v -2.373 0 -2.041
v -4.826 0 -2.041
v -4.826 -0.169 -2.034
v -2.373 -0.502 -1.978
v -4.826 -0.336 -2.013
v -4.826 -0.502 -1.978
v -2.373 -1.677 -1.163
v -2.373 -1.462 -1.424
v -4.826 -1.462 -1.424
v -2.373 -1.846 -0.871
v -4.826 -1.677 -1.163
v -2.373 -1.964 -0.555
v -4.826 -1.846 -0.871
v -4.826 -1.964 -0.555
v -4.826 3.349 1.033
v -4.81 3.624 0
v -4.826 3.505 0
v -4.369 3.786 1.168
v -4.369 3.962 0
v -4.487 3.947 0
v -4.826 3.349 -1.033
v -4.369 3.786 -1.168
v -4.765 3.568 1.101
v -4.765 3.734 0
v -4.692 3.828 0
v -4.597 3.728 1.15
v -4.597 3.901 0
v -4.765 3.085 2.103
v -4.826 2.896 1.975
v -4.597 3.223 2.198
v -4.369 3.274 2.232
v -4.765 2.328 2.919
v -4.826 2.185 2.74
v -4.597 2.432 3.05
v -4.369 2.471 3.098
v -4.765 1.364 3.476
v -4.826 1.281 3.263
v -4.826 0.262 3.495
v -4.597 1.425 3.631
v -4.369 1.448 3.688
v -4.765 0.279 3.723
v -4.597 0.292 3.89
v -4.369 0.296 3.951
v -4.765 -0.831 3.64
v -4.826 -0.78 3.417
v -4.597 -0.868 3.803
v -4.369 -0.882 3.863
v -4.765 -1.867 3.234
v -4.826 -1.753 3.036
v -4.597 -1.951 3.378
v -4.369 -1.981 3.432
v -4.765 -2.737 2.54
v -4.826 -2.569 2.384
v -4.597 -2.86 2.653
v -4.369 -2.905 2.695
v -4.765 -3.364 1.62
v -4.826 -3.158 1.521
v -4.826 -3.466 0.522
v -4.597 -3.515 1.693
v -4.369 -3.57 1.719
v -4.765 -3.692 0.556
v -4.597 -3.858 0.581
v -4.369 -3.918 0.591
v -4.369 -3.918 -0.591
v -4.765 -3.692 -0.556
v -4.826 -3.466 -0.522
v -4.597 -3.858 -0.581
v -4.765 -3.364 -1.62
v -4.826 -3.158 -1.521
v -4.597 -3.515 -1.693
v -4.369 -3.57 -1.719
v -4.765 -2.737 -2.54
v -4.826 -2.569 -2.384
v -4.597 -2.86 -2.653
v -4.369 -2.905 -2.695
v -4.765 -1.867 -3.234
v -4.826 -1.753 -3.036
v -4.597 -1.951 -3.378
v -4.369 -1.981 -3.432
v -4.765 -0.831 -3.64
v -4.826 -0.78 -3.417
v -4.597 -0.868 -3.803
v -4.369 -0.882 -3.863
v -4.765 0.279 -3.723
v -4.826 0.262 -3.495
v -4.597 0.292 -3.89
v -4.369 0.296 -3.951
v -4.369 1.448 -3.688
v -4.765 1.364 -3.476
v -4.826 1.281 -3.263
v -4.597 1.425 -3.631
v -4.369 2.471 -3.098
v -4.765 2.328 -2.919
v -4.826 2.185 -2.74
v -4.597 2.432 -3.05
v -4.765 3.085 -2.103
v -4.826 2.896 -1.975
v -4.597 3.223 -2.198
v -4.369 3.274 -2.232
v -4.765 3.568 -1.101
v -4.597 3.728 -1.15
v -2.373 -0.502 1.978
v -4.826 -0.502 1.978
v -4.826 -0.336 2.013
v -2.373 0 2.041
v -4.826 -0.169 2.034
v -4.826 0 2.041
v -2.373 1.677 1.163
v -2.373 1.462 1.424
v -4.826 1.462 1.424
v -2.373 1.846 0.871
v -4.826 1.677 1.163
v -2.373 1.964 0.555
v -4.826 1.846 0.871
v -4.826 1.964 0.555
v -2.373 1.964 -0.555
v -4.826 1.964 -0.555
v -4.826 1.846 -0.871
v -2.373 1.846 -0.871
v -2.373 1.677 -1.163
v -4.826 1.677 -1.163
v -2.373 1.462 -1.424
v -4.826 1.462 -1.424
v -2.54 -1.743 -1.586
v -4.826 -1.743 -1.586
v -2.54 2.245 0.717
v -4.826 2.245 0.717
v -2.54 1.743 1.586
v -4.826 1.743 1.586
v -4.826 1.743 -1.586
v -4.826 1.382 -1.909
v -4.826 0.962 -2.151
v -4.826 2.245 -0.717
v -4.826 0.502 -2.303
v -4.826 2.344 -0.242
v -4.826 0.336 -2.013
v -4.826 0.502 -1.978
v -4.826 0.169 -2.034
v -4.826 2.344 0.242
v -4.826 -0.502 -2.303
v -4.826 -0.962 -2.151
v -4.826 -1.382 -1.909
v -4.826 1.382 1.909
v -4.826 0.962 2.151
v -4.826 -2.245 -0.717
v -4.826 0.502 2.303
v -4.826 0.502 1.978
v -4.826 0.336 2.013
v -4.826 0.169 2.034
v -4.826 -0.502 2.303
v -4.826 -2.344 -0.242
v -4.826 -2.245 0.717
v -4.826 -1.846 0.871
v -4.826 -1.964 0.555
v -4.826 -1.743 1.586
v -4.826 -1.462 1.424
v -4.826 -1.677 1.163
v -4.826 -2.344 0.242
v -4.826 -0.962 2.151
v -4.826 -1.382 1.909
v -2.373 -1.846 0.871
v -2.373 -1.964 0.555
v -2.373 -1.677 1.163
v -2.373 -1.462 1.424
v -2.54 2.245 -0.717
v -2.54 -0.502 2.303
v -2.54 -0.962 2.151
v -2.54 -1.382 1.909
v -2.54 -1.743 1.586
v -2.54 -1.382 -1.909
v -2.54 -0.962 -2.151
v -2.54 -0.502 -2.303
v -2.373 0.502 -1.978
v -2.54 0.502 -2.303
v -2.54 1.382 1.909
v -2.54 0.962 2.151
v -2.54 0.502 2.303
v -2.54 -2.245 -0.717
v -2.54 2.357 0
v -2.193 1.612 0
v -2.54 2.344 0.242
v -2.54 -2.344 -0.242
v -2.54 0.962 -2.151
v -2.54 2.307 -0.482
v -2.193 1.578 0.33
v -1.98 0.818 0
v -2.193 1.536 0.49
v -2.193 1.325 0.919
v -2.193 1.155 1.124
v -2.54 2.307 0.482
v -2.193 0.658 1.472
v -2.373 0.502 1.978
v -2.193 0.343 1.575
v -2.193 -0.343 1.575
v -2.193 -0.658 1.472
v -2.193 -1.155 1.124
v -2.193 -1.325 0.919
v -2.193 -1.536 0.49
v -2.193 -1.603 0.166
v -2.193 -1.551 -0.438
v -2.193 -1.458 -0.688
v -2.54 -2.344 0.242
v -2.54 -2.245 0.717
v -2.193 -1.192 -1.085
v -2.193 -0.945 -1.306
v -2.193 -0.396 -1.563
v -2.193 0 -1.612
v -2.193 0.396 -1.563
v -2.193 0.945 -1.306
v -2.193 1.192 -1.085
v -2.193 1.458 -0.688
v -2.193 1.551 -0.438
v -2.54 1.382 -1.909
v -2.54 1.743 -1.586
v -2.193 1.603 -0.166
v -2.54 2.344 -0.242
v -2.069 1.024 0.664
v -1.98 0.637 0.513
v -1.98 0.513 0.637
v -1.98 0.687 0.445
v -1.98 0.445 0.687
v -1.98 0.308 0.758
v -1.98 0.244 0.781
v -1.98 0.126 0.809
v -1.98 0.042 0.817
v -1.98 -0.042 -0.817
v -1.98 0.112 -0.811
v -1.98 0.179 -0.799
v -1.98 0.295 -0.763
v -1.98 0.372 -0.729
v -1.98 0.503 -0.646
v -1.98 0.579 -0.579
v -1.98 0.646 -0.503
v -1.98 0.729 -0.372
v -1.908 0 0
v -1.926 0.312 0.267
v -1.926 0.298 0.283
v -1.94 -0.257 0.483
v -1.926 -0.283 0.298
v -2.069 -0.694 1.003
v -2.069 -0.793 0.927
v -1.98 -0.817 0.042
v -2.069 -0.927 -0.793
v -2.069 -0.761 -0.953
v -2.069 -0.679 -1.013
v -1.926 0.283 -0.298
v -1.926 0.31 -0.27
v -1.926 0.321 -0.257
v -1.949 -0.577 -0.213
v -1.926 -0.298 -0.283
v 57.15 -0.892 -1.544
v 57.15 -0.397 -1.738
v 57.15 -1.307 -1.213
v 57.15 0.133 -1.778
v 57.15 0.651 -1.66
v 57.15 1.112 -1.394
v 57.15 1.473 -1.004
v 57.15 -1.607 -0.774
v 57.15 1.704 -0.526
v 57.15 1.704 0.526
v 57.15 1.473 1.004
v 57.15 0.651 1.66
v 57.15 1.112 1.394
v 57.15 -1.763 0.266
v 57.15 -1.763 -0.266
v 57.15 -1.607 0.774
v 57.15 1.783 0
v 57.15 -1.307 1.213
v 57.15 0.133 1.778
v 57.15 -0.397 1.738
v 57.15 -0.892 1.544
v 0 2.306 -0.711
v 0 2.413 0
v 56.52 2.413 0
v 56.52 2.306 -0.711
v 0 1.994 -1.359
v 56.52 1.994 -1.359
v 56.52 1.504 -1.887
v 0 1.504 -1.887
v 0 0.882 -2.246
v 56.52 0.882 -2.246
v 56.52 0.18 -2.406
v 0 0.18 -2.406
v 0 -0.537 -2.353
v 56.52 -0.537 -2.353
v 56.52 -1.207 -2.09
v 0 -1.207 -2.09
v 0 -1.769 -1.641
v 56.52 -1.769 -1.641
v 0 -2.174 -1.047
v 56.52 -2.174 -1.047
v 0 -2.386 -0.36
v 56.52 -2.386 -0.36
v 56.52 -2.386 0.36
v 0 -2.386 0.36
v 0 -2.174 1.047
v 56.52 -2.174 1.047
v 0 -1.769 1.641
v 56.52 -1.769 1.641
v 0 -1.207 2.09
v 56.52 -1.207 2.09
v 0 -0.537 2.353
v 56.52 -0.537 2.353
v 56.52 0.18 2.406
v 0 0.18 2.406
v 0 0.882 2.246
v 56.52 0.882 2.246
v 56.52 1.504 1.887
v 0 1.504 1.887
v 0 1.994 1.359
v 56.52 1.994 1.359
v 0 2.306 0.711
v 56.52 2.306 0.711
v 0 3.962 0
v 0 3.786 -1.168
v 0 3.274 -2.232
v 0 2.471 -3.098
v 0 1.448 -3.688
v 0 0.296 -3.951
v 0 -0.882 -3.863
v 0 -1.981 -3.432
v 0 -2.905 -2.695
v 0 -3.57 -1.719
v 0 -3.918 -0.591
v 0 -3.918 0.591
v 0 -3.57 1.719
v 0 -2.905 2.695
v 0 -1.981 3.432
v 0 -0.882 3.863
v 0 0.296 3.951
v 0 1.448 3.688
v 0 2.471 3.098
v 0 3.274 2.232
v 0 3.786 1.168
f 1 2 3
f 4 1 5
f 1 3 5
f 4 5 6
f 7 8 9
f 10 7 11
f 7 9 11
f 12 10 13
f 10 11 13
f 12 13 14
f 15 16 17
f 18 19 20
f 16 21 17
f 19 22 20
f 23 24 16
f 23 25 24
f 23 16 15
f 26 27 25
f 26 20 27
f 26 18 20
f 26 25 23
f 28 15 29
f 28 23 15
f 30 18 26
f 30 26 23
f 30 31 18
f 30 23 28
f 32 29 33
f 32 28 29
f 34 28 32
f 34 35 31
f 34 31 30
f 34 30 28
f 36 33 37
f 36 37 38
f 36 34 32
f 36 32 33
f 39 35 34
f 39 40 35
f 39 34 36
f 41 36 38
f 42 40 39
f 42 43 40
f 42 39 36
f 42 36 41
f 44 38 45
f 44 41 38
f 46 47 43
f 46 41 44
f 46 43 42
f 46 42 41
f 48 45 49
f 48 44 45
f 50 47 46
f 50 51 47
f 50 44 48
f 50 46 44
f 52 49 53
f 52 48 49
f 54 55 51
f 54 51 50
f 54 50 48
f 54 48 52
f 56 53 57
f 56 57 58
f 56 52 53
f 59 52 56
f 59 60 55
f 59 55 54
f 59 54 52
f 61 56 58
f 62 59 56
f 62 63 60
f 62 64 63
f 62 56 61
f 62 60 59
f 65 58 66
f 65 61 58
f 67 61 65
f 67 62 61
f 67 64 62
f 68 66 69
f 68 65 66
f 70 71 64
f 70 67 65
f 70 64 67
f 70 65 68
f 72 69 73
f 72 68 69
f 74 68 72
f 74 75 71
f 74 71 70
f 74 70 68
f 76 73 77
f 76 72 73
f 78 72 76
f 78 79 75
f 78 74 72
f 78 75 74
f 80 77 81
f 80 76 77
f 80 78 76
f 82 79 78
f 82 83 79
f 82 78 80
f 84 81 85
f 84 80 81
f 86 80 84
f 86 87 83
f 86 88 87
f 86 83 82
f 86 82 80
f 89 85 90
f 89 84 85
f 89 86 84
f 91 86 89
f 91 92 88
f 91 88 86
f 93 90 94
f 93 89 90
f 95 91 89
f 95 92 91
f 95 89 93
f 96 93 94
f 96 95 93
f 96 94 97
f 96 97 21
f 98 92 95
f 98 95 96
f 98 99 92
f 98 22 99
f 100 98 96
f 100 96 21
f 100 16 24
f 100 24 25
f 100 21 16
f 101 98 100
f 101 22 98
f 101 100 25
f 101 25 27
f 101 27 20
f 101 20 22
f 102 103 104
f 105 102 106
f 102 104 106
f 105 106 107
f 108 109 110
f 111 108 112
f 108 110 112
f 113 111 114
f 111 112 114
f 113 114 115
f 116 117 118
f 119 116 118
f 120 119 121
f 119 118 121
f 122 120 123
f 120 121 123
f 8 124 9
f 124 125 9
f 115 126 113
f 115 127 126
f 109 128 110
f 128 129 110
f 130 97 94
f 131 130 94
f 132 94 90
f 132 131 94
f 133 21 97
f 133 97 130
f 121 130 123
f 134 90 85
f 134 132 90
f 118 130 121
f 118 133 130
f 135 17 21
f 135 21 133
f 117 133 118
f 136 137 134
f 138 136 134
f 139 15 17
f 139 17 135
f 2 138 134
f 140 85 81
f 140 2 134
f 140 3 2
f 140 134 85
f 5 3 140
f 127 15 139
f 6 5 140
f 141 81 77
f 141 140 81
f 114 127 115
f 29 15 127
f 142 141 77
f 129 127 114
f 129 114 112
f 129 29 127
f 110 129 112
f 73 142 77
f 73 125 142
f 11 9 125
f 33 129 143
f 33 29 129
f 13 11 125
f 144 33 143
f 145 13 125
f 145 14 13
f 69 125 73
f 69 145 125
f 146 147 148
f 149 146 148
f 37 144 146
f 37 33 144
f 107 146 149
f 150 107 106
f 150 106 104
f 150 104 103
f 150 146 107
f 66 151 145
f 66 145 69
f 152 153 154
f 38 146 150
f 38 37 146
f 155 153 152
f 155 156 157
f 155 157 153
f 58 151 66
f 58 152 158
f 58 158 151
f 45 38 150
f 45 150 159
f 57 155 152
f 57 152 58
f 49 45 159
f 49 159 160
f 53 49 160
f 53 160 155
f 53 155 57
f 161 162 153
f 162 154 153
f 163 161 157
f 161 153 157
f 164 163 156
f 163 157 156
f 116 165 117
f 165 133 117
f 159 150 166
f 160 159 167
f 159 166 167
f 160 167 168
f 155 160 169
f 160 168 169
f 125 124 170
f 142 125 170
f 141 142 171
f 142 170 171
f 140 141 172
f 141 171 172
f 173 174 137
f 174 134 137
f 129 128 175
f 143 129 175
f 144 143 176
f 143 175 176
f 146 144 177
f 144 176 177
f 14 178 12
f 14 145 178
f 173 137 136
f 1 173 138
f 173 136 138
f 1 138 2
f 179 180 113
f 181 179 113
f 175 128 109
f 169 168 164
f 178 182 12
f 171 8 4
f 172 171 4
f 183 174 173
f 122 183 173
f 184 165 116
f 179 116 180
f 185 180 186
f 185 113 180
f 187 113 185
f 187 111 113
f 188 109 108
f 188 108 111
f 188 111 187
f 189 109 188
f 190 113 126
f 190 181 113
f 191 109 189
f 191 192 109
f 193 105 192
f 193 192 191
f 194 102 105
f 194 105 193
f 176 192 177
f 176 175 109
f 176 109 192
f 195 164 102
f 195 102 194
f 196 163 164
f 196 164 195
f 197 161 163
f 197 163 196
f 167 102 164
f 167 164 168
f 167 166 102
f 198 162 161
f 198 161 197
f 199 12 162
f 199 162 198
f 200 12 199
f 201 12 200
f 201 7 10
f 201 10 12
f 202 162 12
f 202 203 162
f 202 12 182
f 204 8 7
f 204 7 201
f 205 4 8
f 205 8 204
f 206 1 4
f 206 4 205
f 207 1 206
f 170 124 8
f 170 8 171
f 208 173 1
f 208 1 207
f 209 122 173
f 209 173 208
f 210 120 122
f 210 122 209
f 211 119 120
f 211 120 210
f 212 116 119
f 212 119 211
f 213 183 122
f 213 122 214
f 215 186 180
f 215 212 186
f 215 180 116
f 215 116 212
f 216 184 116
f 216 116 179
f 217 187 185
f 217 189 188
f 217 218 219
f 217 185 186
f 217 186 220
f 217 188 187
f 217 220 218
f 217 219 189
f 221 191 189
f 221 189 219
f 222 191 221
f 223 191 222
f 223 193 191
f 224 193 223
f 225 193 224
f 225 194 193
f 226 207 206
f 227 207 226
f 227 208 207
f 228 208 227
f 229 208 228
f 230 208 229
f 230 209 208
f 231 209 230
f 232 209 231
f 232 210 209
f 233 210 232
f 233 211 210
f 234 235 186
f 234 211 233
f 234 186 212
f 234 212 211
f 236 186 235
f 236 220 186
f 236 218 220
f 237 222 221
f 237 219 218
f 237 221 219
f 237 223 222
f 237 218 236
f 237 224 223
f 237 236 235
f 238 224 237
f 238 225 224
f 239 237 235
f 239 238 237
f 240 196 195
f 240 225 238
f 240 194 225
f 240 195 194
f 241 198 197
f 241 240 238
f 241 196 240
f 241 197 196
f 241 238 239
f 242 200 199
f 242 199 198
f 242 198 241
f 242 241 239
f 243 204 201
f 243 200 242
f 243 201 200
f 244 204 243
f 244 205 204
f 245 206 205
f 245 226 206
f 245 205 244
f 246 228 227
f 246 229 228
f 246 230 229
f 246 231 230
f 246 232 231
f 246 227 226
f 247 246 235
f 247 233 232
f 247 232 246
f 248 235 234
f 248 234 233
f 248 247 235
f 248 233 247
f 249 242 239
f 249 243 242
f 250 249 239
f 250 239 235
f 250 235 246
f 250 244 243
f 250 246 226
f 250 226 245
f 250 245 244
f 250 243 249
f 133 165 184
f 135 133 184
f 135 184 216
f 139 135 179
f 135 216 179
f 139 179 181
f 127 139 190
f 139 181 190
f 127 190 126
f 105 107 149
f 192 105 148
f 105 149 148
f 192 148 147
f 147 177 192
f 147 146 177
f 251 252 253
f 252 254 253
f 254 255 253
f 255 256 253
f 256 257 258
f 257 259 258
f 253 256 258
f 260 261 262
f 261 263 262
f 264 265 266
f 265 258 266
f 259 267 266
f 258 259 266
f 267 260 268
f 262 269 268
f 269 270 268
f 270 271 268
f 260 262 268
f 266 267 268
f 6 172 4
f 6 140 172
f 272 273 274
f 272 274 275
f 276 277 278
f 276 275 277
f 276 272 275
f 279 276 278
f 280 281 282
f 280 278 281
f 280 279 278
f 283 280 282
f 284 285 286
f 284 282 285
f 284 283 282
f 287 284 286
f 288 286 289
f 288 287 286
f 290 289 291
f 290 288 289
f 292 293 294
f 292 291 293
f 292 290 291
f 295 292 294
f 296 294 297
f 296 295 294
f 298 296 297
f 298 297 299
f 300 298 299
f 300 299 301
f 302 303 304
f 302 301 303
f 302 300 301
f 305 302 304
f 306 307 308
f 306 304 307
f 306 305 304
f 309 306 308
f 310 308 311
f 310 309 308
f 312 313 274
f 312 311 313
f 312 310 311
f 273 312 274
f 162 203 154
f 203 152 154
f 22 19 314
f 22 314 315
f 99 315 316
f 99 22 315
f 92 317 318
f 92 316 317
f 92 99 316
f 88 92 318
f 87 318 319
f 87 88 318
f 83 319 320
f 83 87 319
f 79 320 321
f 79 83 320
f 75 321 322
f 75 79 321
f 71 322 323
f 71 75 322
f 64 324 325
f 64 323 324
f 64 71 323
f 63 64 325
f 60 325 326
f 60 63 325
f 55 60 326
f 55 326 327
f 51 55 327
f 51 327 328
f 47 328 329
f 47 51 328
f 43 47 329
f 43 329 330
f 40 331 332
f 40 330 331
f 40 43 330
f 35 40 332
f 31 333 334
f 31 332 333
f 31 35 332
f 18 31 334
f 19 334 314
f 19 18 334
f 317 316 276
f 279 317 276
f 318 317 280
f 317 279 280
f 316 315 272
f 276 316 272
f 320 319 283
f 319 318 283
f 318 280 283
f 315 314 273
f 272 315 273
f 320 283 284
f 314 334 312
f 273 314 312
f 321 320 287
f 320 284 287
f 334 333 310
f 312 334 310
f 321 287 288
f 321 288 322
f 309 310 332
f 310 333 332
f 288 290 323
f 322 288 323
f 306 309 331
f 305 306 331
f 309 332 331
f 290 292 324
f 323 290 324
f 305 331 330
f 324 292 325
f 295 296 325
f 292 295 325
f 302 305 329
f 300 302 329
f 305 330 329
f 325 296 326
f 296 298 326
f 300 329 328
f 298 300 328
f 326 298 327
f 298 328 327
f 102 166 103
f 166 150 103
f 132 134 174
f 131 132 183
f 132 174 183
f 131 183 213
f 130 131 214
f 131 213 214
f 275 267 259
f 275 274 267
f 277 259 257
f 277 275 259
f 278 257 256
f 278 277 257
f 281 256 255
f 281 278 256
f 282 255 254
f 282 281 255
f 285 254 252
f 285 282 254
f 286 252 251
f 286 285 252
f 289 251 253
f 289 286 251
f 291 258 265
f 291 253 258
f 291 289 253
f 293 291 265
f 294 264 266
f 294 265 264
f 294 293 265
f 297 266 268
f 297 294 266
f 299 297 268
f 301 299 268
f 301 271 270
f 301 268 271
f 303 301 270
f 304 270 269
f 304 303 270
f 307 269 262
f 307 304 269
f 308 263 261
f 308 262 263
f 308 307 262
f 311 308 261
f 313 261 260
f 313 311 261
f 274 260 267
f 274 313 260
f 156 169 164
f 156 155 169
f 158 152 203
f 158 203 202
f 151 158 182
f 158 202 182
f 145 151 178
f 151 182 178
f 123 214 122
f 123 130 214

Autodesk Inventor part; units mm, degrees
ref_plane "YZ Plane" through (0, 0, 0) normal (1, 0, 0) x (0, 1, 0)
sketch "Sketch1" plane through (0, 0, 0) normal (0, 0, 1) x (1, 0, 0)
  line L0 (-4.826, 0) -> (57.15, 0)
  line L1 (57.15, 0) -> (57.15, 2.413)
  line L2 (57.15, 2.413) -> (0, 2.413)
  line L3 (0, 2.413) -> (0, 3.9624)
  line L4 (-19.3761, 0) -> (69.9044, 0) projected
  line L5 (0, -0.7925) -> (0, 4.7549) projected
  line L6 (0, 3.9624) -> (-4.826, 3.9624)
  line L7 (-4.826, 0) -> (-4.826, 3.9624)
  arc A0 (-1.9085, 0) -> (-2.54, 2.3566) centre (-6.6218, 0) ccw
  line L8 (-4.826, 2.3566) -> (-2.54, 2.3566)
  line L9 (12.7, 2.413) -> (0, 2.413) construction
  dimension "d0" = 57.15
  dimension "d1" = 4.826
  dimension "d2" = 4.826
  dimension "d5" = 7.9248
  dimension "d13" = 4.7132
  dimension "d14" = 4.7132
  dimension "d15" = 2.286
revolve "Body" add sketch "Sketch1" angle 360 about axis through (-4.826, 0, 0) along (1, 0, 0) contours A0 L8 L7 L6 L3 L5 L0 | L5 L2 L1 L0
ref_plane "IDS_WORKPLANE{1}" through (-4.826, 0, 0) normal (1, 0, 0) x (0, 0, -1)
sketch "Sketch2" plane through (-4.826, 0, 0) normal (1, 0, 0) x (0, 0, -1)
  line L0 (0, -5.5474) -> (0, 5.5474) projected
  line L1 (5.7744, 0) -> (-5.5852, 0) projected
  circle A0 centre (0, 0) radius 3.9624 projected
  line L2 (2.3026, 0.5017) -> (1.9783, 0.5016)
  line L3 (0, 0) -> (2.3026, 0.5017) construction
  line L4 (0, 0) -> (4.1516, 3.7764) construction
  line L5 (0, 0) -> (0.7169, 2.2449) construction
  line L6 (0, 0) -> (1.1783, 2.0409) construction
  line L7 (0.7169, 2.2449) -> (0.5547, 1.9641)
  line L8 (1.5857, 1.7433) -> (1.4236, 1.4624)
  line L9 (0, 0) -> (1.5857, 1.7433) construction
  arc A1 (2.0409, 0) -> (1.9783, 0.5016) centre (0, 0) ccw
  arc A2 (1.4236, 1.4624) -> (0.5547, 1.9641) centre (0, 0) ccw
  arc A3 (2.3566, 0) -> (2.3026, 0.5017) centre (0, 0) ccw
  arc A4 (1.5857, 1.7433) -> (0.7169, 2.2449) centre (0, 0) ccw
  arc A5 (2.3026, 0.5017) -> (1.3897, 1.9032) centre (0, 0) ccw construction
  arc A6 (1.9783, 0.5016) -> (1.4236, 1.4624) centre (0, 0) ccw construction
  line L10 (2.3026, -0.5017) -> (1.9783, -0.5016)
  line L11 (0.7169, -2.2449) -> (0.5547, -1.9641)
  line L12 (1.5857, -1.7433) -> (1.4236, -1.4624)
  arc A7 (1.9783, -0.5016) -> (2.0409, 0) centre (0, 0) ccw
  arc A8 (0.5547, -1.9641) -> (1.4236, -1.4624) centre (0, 0) ccw
  arc A9 (2.3026, -0.5017) -> (2.3566, 0) centre (0, 0) ccw
  arc A10 (0.7169, -2.2449) -> (1.5857, -1.7433) centre (0, 0) ccw
  line L13 (-2.3026, 0.5017) -> (-1.9783, 0.5016)
  line L14 (-0.7169, 2.2449) -> (-0.5547, 1.9641)
  line L15 (-1.5857, 1.7433) -> (-1.4236, 1.4624)
  arc A11 (-1.9783, 0.5016) -> (-2.0409, 0) centre (0, 0) ccw
  arc A12 (-0.5547, 1.9641) -> (-1.4236, 1.4624) centre (0, 0) ccw
  arc A13 (-2.3026, 0.5017) -> (-2.3566, 0) centre (0, 0) ccw
  arc A14 (-0.7169, 2.2449) -> (-1.5857, 1.7433) centre (0, 0) ccw
  line L16 (-0.7169, -2.2449) -> (-0.5547, -1.9641)
  arc A15 (-1.4236, -1.4624) -> (-0.5547, -1.9641) centre (0, 0) ccw
  line L17 (-1.5857, -1.7433) -> (-1.4236, -1.4624)
  arc A16 (-1.5857, -1.7433) -> (-0.7169, -2.2449) centre (0, 0) ccw
  arc A17 (-2.0409, 0) -> (-1.9783, -0.5016) centre (0, 0) ccw
  line L18 (-2.3026, -0.5017) -> (-1.9783, -0.5016)
  arc A18 (-2.3566, 0) -> (-2.3026, -0.5017) centre (0, 0) ccw
  point P0 (1.1783, -2.0409)
  point P1 (-1.1783, 2.0409)
  point P2 (-1.1783, -2.0409)
  dimension "d19" = 0.5017
  dimension "d20" = 1.0033
  dimension "d21" = 35.419
  dimension "d22" = 4.7132
  dimension "d23" = 4.0818
extrude "Slot" add sketch "Sketch2" along normal up to next contours A1 L2 A3 L1 | L1 A9 L10 A7 | A17 L18 A18 L1 | L1 A13 L13 A11 | A4 L8 A2 L7 | L11 A8 L12 A10 | L14 A12 L15 A14 | A16 L17 A15 L16
fillet "Fillet1" radius 0.4572 1 edges at (-4.826, -3.9624, 0)
thread "Thread" size "10-24 UNC" class "2A" standard "ANSI Unified Screw Threads" length 22.098
chamfer "Chamfer1" distance 0.6299 distance2 0.6299 1 edges at (57.15, -2.413, 0) measured on face at (57.15, -0.9495, -0.1286)
ref_plane "Work Plane2" through (-2.413, 0, 0) normal (0, 0, -1) x (1, 0, 0)
equation "\"d19\" = 0.5 * SBR"
equation "\"d20\" = SBR"
equation "\"d22\" = 1.1547 * SW"
equation "\"d23\" = SW"
equation "\"d17\" = INTI"
equation "\"d24\" = RR"
equation "\"d6\" = GEL"
equation "\"d9\" = -0.5 * SPD + 0.5 * NND"
equation "\"d10\" = GUL"
equation "\"d0\" = NLG"
equation "\"d1\" = KOH"
equation "\"d2\" = NND"
equation "\"d5\" = KOD"
equation "\"d13\" = 1.1547 * SW"
equation "\"d14\" = 1.1547 * SW"
equation "\"d15\" = INTI"
equation "\"NND\" = 4.826"
equation "\"NLG\" = 57.15"
equation "\"GEL\" = 22.098"
equation "\"KOD\" = 7.9248"
equation "\"KOH\" = 4.826"
equation "\"SPD\" = GD1"
equation "\"GUL\" = 0.62992"
equation "\"SBR\" = 1.0033"
equation "\"INTI\" = 2.286"
equation "\"d11\" = -KOH"
equation "\"SW\" = 4.08178"
equation "\"d16\" = 1.1547 * SW"
equation "\"d18\" = SW"
equation "\"RR\" = 0.4572"
equation "\"TOA\" = 30deg"
equation "\"GD1\" = 3.56616"
equation "\"THREADDIA\" = 4.826"
equation "\"BDM\" = NND"
equation "\"GD\" = NND"
equation "\"GAL\" = 2.64592"
equation "\"E0\" = 4.71678"
properties part number "ANSI B18.3 - 10-24 UNC - 2.25" material "Steel, Mild"
